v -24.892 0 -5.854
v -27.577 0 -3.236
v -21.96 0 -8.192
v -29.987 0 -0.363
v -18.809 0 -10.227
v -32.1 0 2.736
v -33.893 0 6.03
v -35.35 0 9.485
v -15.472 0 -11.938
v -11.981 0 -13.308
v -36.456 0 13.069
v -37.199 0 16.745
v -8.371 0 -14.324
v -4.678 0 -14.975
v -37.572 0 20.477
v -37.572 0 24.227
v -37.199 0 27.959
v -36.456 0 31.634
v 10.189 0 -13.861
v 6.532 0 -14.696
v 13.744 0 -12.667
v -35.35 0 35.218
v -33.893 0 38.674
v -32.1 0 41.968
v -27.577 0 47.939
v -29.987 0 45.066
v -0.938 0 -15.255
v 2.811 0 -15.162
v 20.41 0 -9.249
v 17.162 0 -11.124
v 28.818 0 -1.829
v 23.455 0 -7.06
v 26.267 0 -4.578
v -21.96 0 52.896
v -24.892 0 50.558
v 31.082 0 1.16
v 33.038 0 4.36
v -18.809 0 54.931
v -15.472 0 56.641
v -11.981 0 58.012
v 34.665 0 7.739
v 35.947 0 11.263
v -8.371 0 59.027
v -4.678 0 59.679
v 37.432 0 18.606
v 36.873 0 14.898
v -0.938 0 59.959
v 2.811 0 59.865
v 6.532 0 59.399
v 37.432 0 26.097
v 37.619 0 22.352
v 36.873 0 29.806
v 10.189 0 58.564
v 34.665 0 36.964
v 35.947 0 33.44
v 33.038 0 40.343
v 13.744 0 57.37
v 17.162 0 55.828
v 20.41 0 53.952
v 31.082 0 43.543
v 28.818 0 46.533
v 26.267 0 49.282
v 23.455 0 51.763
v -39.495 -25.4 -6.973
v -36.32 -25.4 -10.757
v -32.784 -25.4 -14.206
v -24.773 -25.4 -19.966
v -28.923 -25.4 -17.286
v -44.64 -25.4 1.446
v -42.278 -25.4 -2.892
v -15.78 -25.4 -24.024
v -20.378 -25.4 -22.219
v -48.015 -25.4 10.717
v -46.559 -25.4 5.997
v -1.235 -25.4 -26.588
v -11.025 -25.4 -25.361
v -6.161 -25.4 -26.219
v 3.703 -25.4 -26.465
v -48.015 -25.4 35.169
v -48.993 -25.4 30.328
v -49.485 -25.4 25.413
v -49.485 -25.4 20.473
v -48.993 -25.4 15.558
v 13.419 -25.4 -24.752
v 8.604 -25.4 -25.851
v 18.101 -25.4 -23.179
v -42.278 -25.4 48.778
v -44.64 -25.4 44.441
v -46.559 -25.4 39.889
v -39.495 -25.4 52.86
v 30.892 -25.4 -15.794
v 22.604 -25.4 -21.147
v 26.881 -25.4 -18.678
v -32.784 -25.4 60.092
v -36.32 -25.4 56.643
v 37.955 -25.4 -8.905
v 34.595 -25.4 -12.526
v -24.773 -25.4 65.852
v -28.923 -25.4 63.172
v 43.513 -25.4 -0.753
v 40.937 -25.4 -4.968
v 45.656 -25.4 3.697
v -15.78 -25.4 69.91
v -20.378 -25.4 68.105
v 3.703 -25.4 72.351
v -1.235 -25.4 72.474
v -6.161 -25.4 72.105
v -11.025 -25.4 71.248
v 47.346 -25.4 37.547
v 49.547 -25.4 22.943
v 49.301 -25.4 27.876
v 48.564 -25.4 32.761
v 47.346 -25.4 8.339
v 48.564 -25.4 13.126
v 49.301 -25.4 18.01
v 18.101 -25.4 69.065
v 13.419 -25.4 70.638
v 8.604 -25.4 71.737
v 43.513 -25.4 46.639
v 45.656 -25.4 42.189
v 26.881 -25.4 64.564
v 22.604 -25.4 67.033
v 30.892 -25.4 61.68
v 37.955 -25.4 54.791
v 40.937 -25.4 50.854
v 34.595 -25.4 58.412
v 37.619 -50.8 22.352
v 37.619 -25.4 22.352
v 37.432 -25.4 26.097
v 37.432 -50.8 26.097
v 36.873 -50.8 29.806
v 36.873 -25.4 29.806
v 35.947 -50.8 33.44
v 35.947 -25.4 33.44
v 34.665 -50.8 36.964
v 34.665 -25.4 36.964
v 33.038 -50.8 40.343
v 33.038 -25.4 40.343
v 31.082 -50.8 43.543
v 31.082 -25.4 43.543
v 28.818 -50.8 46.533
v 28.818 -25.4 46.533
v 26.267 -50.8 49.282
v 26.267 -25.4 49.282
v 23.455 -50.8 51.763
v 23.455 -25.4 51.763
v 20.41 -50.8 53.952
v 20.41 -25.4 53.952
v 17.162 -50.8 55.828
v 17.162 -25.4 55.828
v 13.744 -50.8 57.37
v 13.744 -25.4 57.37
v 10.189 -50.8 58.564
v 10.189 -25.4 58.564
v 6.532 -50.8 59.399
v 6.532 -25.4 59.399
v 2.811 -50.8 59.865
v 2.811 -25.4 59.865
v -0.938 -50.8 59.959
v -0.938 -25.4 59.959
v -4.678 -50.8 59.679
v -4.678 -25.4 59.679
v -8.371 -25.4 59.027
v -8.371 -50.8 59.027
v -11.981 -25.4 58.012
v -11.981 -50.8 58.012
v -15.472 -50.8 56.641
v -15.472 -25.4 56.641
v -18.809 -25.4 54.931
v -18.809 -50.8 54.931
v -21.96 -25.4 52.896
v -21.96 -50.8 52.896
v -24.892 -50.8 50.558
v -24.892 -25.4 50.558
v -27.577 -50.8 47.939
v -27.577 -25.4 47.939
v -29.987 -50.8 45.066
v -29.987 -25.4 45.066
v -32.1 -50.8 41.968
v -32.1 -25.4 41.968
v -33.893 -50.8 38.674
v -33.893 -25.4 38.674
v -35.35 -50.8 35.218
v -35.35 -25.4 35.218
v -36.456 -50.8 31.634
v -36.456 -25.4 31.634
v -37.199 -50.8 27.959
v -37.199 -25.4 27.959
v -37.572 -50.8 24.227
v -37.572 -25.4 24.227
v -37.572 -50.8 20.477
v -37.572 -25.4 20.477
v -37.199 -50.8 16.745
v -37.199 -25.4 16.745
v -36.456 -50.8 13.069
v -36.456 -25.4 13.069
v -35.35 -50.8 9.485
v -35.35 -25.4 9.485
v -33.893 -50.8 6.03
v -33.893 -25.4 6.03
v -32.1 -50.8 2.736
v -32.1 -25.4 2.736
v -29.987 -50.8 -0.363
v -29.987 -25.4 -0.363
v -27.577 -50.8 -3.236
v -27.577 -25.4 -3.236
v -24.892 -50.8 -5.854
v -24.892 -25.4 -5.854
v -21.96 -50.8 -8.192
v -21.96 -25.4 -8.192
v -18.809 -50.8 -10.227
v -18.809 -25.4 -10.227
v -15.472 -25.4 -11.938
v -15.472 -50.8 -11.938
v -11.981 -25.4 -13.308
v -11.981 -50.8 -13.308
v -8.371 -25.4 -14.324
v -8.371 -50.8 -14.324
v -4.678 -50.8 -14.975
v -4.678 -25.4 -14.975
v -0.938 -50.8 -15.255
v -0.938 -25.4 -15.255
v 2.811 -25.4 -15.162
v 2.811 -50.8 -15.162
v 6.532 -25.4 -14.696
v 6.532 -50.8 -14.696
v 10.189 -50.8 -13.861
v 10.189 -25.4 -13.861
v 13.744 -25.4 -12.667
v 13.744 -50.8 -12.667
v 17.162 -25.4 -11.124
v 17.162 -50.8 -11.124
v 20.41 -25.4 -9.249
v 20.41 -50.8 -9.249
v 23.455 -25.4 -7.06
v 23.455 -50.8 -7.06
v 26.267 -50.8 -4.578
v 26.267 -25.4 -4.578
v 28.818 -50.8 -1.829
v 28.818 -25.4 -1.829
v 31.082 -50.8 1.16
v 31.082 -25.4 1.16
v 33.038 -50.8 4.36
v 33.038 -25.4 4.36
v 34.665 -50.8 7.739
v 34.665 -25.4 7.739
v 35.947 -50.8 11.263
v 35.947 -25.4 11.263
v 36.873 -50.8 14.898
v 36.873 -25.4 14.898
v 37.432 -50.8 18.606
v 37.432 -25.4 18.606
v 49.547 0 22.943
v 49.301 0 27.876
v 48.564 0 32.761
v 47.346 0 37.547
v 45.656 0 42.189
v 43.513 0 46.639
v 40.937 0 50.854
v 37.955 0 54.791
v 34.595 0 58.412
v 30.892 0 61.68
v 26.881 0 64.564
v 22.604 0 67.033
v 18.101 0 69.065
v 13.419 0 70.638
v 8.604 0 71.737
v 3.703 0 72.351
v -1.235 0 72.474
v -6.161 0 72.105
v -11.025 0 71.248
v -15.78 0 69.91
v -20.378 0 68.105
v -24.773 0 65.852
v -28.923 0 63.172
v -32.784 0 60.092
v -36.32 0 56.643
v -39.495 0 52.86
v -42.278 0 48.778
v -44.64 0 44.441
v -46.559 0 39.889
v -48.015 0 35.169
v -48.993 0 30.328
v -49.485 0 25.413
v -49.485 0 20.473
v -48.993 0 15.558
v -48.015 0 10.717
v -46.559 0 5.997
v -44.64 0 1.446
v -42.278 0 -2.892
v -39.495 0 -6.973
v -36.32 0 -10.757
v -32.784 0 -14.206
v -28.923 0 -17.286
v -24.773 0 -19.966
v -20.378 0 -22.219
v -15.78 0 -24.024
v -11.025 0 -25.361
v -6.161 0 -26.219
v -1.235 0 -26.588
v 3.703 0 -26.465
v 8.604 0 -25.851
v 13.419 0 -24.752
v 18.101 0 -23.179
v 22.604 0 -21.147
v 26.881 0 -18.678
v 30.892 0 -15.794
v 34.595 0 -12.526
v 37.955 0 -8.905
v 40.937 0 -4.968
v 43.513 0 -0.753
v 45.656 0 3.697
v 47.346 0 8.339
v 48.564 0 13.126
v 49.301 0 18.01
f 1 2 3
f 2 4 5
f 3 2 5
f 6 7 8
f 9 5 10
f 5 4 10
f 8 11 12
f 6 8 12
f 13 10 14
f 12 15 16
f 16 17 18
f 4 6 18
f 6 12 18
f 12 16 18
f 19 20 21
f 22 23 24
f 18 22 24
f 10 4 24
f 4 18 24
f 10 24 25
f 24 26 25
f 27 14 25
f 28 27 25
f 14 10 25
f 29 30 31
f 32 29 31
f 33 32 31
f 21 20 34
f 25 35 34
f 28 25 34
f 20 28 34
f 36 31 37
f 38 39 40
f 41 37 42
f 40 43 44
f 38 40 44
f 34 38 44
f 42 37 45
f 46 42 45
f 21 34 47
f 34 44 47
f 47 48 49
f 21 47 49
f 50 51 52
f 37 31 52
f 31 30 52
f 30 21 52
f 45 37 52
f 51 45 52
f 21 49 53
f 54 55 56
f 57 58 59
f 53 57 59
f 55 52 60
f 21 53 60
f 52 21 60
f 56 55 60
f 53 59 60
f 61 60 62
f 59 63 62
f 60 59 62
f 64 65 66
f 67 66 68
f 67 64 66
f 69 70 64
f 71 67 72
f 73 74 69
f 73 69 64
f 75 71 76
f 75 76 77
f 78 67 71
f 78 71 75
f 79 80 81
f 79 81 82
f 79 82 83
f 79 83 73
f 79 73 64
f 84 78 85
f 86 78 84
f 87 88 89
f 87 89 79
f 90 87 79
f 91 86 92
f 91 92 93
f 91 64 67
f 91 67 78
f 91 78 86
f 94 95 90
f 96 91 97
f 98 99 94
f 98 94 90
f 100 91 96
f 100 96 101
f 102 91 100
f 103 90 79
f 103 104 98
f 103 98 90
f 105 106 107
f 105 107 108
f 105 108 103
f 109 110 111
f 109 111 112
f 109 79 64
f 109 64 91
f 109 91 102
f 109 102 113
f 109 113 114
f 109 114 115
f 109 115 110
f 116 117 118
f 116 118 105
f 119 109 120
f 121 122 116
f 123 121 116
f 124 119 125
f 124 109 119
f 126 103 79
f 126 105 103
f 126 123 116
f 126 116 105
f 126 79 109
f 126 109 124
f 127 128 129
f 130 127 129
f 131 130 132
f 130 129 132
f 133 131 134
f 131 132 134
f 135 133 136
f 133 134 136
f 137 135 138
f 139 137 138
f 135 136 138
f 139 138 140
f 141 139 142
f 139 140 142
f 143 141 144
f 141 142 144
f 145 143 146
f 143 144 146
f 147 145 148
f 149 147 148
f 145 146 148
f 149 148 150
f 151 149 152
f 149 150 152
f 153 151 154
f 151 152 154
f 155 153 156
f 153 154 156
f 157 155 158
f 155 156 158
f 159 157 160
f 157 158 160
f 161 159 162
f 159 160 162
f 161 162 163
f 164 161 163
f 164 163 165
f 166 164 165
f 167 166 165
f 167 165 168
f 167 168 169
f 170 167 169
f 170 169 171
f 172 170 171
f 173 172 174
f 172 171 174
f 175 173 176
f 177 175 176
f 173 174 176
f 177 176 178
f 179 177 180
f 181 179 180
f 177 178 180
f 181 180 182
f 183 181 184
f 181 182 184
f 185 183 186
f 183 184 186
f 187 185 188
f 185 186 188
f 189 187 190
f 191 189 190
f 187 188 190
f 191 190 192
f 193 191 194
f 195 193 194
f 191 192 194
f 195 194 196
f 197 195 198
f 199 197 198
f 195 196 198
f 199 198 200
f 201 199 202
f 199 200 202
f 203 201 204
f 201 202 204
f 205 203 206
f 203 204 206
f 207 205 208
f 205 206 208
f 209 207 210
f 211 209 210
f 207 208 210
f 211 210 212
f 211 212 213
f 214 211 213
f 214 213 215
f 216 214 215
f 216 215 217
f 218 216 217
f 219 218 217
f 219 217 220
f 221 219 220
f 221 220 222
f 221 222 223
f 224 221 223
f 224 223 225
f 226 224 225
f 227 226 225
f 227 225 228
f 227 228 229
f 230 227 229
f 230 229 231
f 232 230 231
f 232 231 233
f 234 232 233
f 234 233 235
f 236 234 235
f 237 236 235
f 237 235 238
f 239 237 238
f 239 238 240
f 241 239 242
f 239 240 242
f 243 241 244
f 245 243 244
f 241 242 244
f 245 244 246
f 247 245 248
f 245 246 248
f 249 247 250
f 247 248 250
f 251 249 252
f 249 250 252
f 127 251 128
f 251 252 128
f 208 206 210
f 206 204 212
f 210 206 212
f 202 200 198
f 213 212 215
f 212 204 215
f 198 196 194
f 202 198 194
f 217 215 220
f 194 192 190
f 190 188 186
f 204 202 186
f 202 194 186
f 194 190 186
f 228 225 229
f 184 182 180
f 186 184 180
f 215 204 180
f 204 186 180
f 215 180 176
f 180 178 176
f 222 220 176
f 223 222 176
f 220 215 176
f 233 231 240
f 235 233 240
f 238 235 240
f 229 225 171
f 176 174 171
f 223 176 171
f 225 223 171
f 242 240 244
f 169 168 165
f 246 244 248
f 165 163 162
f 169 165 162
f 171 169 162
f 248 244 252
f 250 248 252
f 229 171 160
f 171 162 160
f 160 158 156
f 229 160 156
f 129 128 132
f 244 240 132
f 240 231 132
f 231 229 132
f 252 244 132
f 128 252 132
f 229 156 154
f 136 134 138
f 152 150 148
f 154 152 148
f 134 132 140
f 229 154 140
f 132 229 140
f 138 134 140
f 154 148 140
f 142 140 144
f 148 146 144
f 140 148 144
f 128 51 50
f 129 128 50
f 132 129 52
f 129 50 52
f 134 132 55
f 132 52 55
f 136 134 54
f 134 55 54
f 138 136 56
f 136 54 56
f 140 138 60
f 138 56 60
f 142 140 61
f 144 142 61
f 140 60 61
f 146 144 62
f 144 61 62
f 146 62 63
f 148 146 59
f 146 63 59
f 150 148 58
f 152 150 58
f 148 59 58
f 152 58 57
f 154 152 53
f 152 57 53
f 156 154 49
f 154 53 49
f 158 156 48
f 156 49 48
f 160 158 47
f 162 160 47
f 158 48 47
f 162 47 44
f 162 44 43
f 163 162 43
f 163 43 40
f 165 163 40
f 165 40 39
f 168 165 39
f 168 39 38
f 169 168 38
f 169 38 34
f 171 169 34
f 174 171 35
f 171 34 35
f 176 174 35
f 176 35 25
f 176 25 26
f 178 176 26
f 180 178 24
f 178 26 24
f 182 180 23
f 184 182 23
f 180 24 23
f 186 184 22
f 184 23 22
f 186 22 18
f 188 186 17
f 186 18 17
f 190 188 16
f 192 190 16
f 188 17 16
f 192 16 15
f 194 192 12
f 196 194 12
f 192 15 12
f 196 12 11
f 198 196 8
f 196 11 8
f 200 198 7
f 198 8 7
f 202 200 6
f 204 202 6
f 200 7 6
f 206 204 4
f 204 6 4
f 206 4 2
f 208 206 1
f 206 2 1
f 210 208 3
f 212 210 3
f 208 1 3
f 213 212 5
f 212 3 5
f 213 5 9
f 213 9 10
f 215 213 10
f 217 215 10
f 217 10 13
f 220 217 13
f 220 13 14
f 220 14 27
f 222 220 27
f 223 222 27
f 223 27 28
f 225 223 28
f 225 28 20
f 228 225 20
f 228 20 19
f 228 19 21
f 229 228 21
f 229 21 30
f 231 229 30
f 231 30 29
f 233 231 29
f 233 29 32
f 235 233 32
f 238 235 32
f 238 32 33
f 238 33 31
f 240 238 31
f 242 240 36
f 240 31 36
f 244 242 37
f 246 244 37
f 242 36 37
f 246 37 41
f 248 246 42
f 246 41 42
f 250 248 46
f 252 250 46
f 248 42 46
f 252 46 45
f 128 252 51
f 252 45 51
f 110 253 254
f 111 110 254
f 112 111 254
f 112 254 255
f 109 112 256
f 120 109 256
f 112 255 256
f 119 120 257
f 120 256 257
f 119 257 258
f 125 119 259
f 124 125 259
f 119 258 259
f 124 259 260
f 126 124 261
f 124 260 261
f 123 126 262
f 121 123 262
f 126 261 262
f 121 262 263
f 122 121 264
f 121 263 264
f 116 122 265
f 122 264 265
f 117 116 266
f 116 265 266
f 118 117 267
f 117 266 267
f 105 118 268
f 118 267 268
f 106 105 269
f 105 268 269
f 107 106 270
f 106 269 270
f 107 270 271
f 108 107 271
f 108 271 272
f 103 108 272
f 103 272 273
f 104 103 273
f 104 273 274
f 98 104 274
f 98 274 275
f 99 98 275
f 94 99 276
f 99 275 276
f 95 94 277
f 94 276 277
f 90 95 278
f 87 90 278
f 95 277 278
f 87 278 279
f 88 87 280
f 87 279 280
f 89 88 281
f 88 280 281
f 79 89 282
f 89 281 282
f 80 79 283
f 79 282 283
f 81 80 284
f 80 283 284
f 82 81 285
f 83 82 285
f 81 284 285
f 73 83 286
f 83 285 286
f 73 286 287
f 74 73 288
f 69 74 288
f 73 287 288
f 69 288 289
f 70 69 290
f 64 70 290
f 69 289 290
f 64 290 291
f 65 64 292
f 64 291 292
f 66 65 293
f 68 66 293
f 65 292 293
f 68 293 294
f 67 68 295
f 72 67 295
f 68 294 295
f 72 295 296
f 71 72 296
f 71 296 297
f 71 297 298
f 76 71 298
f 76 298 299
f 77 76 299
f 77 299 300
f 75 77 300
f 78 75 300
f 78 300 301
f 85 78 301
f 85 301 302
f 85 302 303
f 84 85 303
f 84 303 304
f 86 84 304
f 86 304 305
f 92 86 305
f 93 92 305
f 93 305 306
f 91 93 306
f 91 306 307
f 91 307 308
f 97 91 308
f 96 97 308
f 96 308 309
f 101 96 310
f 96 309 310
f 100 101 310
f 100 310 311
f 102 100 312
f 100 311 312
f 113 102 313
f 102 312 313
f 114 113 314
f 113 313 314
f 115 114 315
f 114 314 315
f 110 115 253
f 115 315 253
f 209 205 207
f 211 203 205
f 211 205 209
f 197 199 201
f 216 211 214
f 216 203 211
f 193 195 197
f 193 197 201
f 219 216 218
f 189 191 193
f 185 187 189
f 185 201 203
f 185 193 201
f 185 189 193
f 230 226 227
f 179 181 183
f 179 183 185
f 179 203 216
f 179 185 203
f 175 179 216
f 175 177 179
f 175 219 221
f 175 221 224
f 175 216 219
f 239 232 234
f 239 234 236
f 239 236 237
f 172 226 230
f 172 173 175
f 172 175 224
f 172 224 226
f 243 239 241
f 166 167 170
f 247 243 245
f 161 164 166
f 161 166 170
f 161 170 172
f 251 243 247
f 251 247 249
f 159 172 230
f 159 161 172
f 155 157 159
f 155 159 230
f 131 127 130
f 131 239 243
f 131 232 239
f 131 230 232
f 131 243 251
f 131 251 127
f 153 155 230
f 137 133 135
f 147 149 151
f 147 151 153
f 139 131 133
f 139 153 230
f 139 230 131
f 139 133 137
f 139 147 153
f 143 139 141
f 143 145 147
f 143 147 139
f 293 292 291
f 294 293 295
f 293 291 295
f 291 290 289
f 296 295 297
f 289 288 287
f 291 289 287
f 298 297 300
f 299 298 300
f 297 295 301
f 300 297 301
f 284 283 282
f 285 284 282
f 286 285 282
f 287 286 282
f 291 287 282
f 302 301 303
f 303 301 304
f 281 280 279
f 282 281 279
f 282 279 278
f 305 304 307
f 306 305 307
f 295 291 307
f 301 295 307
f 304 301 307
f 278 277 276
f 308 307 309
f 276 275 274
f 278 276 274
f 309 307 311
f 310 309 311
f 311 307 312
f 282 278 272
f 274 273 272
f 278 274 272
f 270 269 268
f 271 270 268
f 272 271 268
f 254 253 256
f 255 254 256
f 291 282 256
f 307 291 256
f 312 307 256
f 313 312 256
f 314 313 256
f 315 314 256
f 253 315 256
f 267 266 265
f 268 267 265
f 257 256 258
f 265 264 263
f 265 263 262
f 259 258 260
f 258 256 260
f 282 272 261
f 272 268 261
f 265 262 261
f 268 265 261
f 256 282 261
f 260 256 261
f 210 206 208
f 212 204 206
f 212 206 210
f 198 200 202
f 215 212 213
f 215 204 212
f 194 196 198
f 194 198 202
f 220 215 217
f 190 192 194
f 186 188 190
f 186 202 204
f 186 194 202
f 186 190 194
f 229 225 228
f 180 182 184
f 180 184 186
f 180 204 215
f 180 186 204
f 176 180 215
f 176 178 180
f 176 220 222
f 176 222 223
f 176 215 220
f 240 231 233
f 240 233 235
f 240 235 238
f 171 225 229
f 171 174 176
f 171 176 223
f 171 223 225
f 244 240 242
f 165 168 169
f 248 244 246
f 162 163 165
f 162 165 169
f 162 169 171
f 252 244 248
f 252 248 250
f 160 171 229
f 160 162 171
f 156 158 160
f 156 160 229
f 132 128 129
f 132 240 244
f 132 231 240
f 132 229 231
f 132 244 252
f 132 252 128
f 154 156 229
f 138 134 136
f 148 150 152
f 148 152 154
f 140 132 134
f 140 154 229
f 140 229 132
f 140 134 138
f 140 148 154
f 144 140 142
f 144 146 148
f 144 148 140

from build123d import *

# Parameters (mm, degrees)
F0_R     = 49.5467317532
F2_DEPTH = 25.4
F1_R     = 37.6187843243
F3_DEPTH = 25.4


with BuildPart() as f2:
    # F0 (on Front) → F2 (new body)
    with BuildSketch(Plane.XZ):
        with Locations((0, 22.9430384934)):
            Circle(F0_R)
    extrude(amount=F2_DEPTH)


with BuildPart() as f2b:
    # F1 (on face) → F2, piece 2 (new body)
    with BuildSketch(Plane.XZ):
        with Locations((0, 22.3517417908)):
            Circle(F1_R)
    extrude(amount=F2_DEPTH)


with BuildPart() as f3:
    # F3 (new): a face of the model
    f3_faces = [f2b.part.faces().sort_by_distance(p)[0] for p in [
        (0, -25.4, 22.3517417908),
    ]]
    extrude(f3_faces, amount=F3_DEPTH)


solid = Compound([f2.part, f2b.part, f3.part])
